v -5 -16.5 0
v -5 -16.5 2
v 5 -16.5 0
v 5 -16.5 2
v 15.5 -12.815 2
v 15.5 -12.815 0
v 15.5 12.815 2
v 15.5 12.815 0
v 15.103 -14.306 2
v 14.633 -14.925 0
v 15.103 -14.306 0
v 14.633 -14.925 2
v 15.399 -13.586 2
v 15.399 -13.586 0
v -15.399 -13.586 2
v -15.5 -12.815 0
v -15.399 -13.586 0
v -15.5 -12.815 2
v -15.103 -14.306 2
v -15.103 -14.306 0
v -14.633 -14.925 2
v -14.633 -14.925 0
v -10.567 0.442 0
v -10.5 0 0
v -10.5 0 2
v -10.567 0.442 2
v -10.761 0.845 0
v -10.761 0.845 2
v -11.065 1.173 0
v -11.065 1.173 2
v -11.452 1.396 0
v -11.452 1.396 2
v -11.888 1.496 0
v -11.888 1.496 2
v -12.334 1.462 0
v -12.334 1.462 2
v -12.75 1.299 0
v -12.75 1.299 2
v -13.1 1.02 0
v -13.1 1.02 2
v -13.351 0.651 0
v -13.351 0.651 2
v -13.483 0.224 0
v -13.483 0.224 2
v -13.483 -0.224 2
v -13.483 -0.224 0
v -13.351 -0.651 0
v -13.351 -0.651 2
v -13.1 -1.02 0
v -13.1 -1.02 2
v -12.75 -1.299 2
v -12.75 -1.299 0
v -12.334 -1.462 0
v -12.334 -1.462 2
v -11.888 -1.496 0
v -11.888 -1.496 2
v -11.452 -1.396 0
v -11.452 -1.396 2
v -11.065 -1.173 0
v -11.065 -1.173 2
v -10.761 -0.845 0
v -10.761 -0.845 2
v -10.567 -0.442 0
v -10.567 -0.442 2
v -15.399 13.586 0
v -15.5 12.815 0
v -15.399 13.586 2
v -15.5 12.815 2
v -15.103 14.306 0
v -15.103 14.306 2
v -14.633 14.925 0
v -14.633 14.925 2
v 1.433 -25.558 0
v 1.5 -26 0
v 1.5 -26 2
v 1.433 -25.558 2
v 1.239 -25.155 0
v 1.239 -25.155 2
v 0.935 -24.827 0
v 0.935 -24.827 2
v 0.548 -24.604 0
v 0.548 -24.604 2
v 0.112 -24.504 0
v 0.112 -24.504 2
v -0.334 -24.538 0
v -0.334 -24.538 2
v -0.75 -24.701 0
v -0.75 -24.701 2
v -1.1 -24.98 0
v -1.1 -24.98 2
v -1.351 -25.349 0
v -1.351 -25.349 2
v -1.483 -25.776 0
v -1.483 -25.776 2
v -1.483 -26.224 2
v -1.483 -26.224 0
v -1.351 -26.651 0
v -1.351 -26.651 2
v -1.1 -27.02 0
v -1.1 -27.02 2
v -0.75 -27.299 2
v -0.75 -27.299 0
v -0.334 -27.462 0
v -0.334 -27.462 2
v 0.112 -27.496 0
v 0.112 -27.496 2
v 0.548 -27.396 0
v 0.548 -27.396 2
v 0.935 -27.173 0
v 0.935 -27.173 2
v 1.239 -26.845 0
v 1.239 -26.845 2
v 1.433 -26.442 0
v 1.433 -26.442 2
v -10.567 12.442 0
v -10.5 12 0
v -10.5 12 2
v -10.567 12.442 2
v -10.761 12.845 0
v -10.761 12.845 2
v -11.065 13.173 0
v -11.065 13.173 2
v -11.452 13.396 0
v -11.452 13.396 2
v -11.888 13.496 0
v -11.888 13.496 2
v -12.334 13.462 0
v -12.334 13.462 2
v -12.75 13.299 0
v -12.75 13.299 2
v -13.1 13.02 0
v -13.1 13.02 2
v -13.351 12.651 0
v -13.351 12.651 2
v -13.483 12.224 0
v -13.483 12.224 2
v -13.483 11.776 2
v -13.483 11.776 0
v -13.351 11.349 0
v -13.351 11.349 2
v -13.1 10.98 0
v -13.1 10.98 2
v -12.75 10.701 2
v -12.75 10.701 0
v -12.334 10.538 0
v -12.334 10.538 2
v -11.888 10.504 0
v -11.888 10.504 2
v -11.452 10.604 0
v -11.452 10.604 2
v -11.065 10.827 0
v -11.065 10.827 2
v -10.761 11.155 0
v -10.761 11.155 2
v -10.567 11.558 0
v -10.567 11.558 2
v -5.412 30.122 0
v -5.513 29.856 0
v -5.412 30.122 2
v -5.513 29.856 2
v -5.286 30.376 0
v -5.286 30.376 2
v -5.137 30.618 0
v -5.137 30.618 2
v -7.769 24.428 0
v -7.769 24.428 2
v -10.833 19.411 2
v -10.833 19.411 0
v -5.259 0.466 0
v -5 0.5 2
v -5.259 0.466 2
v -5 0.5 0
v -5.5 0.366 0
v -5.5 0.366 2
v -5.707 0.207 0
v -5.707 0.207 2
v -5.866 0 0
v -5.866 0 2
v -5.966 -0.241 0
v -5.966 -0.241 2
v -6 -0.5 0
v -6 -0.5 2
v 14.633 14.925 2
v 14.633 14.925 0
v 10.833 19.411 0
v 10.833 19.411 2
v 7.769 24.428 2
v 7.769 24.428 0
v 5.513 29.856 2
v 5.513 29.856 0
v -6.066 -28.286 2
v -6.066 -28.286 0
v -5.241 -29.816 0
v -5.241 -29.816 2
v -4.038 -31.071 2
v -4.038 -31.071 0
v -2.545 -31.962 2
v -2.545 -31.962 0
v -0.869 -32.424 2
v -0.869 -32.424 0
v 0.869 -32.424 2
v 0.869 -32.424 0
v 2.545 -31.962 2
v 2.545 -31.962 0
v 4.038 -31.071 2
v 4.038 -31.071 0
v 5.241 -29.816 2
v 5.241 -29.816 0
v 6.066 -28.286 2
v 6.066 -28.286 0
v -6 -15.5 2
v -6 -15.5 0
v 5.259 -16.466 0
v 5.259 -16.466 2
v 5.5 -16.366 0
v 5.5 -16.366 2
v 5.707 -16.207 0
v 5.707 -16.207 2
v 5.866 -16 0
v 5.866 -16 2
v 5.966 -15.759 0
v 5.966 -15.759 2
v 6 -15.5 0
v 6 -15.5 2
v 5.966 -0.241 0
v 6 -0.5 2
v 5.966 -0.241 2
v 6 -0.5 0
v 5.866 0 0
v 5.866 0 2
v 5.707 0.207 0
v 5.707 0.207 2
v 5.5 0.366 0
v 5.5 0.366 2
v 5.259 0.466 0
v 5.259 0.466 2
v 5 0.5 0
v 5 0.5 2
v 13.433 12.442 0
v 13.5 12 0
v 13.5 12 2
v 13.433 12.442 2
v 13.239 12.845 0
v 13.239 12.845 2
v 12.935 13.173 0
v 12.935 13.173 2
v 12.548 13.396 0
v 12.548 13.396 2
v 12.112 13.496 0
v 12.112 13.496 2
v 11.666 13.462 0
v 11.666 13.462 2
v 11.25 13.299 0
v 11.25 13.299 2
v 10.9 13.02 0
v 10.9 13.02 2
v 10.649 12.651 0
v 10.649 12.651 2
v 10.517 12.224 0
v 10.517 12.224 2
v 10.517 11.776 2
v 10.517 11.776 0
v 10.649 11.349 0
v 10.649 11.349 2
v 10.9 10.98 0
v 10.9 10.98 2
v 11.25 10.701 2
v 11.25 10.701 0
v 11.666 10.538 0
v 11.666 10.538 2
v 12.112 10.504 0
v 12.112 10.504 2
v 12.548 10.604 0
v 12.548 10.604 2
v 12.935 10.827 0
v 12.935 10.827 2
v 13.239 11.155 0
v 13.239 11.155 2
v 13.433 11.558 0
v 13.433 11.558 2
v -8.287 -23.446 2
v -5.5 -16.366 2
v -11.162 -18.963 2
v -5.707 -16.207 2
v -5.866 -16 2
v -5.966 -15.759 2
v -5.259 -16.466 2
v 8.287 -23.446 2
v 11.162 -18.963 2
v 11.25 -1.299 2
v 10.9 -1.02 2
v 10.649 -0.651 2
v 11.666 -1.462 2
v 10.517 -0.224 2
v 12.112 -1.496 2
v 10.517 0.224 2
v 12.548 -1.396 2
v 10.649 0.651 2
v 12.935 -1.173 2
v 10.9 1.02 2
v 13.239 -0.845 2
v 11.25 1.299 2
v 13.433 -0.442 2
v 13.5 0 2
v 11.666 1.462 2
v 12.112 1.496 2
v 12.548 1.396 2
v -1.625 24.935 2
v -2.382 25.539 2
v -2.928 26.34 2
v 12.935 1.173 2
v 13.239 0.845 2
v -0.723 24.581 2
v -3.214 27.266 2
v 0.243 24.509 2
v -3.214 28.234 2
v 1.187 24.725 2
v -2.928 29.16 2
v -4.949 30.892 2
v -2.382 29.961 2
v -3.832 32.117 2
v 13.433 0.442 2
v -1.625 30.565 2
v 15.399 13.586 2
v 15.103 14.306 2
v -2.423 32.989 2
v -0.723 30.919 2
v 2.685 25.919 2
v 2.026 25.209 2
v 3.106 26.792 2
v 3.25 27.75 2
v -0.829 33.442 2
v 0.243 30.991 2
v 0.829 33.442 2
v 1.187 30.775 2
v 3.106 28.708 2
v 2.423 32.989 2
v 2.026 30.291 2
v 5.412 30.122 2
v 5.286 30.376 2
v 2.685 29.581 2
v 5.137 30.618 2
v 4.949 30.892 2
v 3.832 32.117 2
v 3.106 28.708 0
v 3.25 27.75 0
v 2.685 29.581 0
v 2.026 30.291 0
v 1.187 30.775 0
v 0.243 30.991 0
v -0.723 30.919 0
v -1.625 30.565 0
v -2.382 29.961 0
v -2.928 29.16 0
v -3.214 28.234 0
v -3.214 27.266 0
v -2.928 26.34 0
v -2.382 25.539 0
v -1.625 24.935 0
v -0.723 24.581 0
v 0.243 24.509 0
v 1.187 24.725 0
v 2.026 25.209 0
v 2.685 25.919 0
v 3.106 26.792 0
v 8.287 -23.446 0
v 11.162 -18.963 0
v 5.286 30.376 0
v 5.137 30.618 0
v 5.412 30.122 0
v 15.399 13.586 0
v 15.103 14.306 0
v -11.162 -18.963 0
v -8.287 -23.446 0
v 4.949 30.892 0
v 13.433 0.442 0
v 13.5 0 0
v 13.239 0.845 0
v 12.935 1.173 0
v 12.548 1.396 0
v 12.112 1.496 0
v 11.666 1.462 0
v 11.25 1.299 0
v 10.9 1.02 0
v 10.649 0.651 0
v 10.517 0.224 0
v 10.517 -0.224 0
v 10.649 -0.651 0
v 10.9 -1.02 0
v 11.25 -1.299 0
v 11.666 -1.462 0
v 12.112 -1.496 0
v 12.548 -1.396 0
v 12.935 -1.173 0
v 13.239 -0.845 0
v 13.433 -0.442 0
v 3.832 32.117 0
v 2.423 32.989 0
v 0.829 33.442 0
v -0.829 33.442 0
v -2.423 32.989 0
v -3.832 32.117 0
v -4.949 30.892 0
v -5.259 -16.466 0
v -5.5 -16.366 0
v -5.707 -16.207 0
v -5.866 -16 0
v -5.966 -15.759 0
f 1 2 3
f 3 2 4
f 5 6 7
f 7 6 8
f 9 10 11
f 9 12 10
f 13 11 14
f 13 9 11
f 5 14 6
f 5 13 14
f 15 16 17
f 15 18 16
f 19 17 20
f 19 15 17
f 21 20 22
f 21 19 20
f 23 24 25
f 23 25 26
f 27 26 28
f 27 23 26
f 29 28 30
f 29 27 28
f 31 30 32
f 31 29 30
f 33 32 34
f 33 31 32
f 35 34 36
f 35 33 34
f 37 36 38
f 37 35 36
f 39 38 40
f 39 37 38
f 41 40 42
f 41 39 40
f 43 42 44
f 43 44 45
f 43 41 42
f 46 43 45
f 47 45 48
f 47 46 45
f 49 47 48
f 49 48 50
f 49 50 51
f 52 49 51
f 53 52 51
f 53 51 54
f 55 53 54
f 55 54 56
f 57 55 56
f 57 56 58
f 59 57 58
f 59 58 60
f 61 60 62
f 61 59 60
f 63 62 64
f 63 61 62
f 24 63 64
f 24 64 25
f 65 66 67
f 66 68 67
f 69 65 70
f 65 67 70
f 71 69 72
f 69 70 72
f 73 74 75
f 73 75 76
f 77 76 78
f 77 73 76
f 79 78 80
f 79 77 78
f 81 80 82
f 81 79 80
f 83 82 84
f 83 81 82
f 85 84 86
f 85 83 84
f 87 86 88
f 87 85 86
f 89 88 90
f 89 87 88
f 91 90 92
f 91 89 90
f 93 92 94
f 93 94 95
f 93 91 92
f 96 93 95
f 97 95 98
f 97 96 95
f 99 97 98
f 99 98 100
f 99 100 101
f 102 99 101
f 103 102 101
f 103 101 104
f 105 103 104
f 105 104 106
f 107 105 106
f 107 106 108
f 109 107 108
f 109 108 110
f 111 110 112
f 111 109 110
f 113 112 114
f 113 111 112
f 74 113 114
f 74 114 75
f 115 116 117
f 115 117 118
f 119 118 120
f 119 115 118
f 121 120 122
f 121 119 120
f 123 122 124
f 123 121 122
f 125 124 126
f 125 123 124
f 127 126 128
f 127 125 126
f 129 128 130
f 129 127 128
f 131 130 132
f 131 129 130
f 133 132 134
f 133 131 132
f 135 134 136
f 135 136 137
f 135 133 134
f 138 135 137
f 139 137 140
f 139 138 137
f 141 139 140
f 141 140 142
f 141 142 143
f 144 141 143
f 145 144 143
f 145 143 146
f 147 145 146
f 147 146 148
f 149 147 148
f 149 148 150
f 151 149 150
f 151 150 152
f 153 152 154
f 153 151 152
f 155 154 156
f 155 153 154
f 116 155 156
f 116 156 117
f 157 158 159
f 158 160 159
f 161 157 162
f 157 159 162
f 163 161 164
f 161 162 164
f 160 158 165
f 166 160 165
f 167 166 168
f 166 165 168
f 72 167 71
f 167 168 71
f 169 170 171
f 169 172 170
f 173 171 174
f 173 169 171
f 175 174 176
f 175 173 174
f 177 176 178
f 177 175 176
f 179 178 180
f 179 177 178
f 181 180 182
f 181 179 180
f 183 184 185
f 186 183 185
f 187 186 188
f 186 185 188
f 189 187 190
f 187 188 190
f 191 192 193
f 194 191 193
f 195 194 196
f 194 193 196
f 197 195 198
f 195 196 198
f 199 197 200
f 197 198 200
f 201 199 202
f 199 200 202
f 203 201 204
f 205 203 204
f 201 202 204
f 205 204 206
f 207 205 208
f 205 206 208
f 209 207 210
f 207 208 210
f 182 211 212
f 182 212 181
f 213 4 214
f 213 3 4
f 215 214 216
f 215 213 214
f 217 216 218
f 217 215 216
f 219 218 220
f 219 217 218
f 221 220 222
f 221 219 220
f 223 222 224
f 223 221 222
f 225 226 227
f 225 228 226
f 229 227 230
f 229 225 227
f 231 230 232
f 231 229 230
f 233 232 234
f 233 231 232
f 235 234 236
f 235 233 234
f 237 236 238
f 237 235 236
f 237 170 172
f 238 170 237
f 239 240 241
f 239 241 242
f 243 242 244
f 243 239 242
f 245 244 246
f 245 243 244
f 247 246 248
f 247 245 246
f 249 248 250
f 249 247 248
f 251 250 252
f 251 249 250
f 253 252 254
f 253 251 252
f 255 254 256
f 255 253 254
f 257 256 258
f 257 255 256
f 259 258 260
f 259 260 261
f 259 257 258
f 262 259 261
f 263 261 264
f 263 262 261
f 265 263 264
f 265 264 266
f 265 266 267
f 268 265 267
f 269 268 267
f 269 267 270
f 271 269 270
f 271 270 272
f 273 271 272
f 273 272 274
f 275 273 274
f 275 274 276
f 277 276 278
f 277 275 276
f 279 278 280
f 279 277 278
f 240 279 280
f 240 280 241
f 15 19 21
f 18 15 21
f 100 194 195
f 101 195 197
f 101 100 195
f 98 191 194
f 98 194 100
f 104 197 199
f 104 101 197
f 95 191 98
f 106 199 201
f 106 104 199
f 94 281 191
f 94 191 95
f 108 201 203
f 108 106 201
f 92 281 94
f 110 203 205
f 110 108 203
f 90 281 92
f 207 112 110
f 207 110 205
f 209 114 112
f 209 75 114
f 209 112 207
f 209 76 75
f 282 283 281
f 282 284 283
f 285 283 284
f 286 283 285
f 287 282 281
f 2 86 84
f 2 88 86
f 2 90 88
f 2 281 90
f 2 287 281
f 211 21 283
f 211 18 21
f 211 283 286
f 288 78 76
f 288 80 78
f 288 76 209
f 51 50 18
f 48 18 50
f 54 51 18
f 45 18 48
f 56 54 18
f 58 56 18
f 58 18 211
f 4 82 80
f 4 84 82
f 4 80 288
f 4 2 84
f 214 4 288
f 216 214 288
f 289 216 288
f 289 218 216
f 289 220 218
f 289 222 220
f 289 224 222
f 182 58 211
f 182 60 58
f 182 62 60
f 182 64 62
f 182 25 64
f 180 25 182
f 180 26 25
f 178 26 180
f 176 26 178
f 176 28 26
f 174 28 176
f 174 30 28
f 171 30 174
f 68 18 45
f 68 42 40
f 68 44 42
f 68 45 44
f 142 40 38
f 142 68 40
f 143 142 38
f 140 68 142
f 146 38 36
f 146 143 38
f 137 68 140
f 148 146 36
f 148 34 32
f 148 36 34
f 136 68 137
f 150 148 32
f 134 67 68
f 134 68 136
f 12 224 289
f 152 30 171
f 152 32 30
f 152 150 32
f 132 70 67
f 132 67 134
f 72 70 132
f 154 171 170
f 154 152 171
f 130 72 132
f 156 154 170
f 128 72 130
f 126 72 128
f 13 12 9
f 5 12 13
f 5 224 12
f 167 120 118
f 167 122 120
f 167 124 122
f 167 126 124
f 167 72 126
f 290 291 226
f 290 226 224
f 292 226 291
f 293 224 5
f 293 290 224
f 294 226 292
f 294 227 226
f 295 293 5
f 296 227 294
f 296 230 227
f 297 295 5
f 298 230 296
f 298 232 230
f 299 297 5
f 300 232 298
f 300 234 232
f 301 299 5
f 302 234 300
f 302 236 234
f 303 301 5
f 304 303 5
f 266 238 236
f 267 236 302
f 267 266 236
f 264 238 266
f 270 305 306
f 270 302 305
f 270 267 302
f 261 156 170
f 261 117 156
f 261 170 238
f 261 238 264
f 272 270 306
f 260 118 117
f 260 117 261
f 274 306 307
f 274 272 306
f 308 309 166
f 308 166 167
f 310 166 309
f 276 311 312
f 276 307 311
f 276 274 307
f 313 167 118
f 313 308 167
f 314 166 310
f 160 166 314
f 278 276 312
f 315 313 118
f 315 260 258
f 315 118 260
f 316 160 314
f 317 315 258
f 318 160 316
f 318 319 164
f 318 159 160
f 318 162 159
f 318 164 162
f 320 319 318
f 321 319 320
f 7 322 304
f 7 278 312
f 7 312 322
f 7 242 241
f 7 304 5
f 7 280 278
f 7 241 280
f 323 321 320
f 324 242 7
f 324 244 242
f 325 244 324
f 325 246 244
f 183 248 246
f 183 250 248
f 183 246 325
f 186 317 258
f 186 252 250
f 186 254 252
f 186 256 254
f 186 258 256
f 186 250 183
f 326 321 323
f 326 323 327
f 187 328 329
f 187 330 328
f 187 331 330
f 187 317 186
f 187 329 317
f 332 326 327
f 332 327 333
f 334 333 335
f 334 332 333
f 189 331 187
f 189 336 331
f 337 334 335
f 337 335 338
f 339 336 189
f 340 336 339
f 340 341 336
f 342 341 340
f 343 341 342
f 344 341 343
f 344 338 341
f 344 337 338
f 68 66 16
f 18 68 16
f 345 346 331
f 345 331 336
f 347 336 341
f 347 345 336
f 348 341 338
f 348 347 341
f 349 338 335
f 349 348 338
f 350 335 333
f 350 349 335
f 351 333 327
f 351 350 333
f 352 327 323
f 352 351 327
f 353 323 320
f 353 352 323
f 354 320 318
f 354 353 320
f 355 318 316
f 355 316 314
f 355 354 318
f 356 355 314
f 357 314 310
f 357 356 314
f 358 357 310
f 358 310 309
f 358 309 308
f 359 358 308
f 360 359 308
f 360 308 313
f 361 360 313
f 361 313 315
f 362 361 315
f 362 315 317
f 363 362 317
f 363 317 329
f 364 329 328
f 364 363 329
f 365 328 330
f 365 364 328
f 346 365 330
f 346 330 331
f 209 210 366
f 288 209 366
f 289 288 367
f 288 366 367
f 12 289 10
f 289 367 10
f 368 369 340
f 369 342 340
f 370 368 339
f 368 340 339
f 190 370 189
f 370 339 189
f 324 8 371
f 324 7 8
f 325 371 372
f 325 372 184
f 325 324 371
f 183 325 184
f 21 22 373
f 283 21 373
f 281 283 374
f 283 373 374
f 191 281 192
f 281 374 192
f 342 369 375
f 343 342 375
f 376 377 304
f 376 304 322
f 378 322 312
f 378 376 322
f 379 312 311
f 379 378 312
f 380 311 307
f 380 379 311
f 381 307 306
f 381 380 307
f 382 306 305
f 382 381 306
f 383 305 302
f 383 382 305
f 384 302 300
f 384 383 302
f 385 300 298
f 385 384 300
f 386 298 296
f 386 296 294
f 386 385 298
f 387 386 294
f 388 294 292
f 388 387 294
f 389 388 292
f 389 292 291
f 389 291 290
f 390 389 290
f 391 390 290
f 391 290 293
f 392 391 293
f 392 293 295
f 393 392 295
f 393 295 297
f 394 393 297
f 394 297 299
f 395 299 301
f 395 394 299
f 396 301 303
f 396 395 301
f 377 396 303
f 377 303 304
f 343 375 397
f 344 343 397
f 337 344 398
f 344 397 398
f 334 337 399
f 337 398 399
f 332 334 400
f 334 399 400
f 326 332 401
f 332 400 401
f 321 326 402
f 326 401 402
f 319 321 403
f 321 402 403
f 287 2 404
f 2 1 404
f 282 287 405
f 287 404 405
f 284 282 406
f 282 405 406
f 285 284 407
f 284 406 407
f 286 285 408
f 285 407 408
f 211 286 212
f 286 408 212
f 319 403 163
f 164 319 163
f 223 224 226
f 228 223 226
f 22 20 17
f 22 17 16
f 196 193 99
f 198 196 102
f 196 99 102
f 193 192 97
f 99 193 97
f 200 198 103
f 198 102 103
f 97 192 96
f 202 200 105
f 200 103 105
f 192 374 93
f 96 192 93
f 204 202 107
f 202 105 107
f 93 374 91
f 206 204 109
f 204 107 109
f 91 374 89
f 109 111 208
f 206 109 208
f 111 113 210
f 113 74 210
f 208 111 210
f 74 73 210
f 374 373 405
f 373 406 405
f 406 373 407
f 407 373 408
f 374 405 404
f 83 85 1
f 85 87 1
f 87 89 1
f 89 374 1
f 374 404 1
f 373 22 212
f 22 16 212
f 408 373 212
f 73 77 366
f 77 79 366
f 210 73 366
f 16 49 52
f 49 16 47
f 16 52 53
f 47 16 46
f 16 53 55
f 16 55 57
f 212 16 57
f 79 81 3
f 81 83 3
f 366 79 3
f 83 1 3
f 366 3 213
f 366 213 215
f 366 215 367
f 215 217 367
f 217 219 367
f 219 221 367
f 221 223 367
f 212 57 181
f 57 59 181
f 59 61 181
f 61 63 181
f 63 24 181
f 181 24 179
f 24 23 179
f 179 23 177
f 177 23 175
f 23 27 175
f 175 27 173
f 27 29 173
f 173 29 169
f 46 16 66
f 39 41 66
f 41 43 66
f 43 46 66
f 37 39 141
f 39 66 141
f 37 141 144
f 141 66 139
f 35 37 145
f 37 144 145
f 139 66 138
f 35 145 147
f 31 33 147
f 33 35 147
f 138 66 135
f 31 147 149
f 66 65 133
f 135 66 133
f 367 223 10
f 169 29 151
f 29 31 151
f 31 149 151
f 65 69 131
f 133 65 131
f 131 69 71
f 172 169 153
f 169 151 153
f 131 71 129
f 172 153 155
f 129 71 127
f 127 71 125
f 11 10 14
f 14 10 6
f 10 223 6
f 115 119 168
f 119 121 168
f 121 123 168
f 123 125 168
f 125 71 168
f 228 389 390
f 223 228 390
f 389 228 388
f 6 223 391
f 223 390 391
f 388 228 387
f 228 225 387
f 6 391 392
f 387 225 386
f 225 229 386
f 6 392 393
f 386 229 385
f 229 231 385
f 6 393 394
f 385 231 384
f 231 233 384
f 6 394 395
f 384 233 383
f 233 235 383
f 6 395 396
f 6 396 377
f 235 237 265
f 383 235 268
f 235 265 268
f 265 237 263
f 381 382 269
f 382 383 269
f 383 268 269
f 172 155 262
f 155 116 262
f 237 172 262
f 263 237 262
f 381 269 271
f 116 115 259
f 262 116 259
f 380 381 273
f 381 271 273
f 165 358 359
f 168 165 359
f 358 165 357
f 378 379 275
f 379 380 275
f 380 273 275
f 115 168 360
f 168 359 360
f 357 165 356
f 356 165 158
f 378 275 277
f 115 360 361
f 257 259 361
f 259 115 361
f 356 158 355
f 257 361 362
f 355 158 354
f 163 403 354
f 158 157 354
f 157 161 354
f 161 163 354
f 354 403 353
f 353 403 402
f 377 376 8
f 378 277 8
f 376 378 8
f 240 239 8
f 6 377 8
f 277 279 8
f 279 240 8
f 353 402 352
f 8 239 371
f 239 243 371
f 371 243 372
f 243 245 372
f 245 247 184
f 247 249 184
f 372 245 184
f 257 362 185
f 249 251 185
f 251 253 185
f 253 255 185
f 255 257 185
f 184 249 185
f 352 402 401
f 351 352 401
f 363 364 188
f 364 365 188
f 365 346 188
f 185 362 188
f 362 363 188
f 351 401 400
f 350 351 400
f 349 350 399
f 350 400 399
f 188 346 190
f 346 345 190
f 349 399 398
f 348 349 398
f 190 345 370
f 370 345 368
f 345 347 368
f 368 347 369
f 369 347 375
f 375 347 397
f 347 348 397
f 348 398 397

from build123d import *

# Parameters (mm, degrees)
F0_R     = 1.5
F0_R_2   = 3.25
F1_DEPTH = 2
F2_R     = 3
F3_W     = 12
F3_H     = 17
F4_DEPTH = 25
F5_R     = 1


with BuildPart() as f1:
    # F0 (on Top) → F1 (new body)
    with BuildSketch(Plane.XY):
        with BuildLine():
            Line((-15.5, 14.0758867192), (-15.5, -14.0758867192))
            ThreePointArc((-15.5, -14.0758867192), (-9.9776979071, -20.6460779619), (-6.0661514917, -28.2856485004))
            ThreePointArc((-6.0661514917, -28.2856485004), (0, -32.4824673534), (6.0661514917, -28.2856485004))
            ThreePointArc((6.0661514917, -28.2856485004), (9.9776979071, -20.6460779619), (15.5, -14.0758867192))
            Line((15.5, -14.0758867192), (15.5, 14.0758867192))
            ThreePointArc((15.5, 14.0758867192), (9.4126848848, 21.5229485882), (5.3843378024, 30.2571661019))
            Line((5.3843378024, 30.2571661019), (4.948926344, 30.8923631943))
            ThreePointArc((4.948926344, 30.8923631943), (0, 33.5), (-4.948926344, 30.8923631943))
            Line((-4.948926344, 30.8923631943), (-5.3843378024, 30.2571661019))
            ThreePointArc((-5.3843378024, 30.2571661019), (-9.4126848848, 21.5229485882), (-15.5, 14.0758867192))
        make_face()
        with Locations((0, -26)):
            Circle(F0_R, mode=Mode.SUBTRACT)
        with Locations((-12, 0)):
            Circle(F0_R, mode=Mode.SUBTRACT)
        with Locations((12, 0)):
            Circle(F0_R, mode=Mode.SUBTRACT)
        with Locations((-12, 12)):
            Circle(F0_R, mode=Mode.SUBTRACT)
        with Locations((0, 27.75)):
            Circle(F0_R_2, mode=Mode.SUBTRACT)
        with Locations((12, 12)):
            Circle(F0_R, mode=Mode.SUBTRACT)
    extrude(amount=F1_DEPTH)

    # F2
    f2_edges = [f1.edges().sort_by_distance(p)[0] for p in [
        (-15.5, 14.075887, 1),
        (5.384338, 30.257166, 1),
        (-5.384338, 30.257166, 1),
        (-15.5, -14.075887, 1),
        (15.5, -14.075887, 1),
        (15.5, 14.075887, 1),
    ]]
    fillet(f2_edges, radius=F2_R)

    # F3 (on face) → F4 (cut)
    with BuildSketch(Plane.XY.offset(2)):
        with Locations((0, -8)):
            Rectangle(F3_W, F3_H)
    extrude(amount=-F4_DEPTH, mode=Mode.SUBTRACT)

    # F5
    f5_edges = [f1.edges().sort_by_distance(p)[0] for p in [
        (-6, 0.5, 1),
        (6, 0.5, 1),
        (6, -16.5, 1),
        (-6, -16.5, 1),
    ]]
    fillet(f5_edges, radius=F5_R)


solid = f1.part
